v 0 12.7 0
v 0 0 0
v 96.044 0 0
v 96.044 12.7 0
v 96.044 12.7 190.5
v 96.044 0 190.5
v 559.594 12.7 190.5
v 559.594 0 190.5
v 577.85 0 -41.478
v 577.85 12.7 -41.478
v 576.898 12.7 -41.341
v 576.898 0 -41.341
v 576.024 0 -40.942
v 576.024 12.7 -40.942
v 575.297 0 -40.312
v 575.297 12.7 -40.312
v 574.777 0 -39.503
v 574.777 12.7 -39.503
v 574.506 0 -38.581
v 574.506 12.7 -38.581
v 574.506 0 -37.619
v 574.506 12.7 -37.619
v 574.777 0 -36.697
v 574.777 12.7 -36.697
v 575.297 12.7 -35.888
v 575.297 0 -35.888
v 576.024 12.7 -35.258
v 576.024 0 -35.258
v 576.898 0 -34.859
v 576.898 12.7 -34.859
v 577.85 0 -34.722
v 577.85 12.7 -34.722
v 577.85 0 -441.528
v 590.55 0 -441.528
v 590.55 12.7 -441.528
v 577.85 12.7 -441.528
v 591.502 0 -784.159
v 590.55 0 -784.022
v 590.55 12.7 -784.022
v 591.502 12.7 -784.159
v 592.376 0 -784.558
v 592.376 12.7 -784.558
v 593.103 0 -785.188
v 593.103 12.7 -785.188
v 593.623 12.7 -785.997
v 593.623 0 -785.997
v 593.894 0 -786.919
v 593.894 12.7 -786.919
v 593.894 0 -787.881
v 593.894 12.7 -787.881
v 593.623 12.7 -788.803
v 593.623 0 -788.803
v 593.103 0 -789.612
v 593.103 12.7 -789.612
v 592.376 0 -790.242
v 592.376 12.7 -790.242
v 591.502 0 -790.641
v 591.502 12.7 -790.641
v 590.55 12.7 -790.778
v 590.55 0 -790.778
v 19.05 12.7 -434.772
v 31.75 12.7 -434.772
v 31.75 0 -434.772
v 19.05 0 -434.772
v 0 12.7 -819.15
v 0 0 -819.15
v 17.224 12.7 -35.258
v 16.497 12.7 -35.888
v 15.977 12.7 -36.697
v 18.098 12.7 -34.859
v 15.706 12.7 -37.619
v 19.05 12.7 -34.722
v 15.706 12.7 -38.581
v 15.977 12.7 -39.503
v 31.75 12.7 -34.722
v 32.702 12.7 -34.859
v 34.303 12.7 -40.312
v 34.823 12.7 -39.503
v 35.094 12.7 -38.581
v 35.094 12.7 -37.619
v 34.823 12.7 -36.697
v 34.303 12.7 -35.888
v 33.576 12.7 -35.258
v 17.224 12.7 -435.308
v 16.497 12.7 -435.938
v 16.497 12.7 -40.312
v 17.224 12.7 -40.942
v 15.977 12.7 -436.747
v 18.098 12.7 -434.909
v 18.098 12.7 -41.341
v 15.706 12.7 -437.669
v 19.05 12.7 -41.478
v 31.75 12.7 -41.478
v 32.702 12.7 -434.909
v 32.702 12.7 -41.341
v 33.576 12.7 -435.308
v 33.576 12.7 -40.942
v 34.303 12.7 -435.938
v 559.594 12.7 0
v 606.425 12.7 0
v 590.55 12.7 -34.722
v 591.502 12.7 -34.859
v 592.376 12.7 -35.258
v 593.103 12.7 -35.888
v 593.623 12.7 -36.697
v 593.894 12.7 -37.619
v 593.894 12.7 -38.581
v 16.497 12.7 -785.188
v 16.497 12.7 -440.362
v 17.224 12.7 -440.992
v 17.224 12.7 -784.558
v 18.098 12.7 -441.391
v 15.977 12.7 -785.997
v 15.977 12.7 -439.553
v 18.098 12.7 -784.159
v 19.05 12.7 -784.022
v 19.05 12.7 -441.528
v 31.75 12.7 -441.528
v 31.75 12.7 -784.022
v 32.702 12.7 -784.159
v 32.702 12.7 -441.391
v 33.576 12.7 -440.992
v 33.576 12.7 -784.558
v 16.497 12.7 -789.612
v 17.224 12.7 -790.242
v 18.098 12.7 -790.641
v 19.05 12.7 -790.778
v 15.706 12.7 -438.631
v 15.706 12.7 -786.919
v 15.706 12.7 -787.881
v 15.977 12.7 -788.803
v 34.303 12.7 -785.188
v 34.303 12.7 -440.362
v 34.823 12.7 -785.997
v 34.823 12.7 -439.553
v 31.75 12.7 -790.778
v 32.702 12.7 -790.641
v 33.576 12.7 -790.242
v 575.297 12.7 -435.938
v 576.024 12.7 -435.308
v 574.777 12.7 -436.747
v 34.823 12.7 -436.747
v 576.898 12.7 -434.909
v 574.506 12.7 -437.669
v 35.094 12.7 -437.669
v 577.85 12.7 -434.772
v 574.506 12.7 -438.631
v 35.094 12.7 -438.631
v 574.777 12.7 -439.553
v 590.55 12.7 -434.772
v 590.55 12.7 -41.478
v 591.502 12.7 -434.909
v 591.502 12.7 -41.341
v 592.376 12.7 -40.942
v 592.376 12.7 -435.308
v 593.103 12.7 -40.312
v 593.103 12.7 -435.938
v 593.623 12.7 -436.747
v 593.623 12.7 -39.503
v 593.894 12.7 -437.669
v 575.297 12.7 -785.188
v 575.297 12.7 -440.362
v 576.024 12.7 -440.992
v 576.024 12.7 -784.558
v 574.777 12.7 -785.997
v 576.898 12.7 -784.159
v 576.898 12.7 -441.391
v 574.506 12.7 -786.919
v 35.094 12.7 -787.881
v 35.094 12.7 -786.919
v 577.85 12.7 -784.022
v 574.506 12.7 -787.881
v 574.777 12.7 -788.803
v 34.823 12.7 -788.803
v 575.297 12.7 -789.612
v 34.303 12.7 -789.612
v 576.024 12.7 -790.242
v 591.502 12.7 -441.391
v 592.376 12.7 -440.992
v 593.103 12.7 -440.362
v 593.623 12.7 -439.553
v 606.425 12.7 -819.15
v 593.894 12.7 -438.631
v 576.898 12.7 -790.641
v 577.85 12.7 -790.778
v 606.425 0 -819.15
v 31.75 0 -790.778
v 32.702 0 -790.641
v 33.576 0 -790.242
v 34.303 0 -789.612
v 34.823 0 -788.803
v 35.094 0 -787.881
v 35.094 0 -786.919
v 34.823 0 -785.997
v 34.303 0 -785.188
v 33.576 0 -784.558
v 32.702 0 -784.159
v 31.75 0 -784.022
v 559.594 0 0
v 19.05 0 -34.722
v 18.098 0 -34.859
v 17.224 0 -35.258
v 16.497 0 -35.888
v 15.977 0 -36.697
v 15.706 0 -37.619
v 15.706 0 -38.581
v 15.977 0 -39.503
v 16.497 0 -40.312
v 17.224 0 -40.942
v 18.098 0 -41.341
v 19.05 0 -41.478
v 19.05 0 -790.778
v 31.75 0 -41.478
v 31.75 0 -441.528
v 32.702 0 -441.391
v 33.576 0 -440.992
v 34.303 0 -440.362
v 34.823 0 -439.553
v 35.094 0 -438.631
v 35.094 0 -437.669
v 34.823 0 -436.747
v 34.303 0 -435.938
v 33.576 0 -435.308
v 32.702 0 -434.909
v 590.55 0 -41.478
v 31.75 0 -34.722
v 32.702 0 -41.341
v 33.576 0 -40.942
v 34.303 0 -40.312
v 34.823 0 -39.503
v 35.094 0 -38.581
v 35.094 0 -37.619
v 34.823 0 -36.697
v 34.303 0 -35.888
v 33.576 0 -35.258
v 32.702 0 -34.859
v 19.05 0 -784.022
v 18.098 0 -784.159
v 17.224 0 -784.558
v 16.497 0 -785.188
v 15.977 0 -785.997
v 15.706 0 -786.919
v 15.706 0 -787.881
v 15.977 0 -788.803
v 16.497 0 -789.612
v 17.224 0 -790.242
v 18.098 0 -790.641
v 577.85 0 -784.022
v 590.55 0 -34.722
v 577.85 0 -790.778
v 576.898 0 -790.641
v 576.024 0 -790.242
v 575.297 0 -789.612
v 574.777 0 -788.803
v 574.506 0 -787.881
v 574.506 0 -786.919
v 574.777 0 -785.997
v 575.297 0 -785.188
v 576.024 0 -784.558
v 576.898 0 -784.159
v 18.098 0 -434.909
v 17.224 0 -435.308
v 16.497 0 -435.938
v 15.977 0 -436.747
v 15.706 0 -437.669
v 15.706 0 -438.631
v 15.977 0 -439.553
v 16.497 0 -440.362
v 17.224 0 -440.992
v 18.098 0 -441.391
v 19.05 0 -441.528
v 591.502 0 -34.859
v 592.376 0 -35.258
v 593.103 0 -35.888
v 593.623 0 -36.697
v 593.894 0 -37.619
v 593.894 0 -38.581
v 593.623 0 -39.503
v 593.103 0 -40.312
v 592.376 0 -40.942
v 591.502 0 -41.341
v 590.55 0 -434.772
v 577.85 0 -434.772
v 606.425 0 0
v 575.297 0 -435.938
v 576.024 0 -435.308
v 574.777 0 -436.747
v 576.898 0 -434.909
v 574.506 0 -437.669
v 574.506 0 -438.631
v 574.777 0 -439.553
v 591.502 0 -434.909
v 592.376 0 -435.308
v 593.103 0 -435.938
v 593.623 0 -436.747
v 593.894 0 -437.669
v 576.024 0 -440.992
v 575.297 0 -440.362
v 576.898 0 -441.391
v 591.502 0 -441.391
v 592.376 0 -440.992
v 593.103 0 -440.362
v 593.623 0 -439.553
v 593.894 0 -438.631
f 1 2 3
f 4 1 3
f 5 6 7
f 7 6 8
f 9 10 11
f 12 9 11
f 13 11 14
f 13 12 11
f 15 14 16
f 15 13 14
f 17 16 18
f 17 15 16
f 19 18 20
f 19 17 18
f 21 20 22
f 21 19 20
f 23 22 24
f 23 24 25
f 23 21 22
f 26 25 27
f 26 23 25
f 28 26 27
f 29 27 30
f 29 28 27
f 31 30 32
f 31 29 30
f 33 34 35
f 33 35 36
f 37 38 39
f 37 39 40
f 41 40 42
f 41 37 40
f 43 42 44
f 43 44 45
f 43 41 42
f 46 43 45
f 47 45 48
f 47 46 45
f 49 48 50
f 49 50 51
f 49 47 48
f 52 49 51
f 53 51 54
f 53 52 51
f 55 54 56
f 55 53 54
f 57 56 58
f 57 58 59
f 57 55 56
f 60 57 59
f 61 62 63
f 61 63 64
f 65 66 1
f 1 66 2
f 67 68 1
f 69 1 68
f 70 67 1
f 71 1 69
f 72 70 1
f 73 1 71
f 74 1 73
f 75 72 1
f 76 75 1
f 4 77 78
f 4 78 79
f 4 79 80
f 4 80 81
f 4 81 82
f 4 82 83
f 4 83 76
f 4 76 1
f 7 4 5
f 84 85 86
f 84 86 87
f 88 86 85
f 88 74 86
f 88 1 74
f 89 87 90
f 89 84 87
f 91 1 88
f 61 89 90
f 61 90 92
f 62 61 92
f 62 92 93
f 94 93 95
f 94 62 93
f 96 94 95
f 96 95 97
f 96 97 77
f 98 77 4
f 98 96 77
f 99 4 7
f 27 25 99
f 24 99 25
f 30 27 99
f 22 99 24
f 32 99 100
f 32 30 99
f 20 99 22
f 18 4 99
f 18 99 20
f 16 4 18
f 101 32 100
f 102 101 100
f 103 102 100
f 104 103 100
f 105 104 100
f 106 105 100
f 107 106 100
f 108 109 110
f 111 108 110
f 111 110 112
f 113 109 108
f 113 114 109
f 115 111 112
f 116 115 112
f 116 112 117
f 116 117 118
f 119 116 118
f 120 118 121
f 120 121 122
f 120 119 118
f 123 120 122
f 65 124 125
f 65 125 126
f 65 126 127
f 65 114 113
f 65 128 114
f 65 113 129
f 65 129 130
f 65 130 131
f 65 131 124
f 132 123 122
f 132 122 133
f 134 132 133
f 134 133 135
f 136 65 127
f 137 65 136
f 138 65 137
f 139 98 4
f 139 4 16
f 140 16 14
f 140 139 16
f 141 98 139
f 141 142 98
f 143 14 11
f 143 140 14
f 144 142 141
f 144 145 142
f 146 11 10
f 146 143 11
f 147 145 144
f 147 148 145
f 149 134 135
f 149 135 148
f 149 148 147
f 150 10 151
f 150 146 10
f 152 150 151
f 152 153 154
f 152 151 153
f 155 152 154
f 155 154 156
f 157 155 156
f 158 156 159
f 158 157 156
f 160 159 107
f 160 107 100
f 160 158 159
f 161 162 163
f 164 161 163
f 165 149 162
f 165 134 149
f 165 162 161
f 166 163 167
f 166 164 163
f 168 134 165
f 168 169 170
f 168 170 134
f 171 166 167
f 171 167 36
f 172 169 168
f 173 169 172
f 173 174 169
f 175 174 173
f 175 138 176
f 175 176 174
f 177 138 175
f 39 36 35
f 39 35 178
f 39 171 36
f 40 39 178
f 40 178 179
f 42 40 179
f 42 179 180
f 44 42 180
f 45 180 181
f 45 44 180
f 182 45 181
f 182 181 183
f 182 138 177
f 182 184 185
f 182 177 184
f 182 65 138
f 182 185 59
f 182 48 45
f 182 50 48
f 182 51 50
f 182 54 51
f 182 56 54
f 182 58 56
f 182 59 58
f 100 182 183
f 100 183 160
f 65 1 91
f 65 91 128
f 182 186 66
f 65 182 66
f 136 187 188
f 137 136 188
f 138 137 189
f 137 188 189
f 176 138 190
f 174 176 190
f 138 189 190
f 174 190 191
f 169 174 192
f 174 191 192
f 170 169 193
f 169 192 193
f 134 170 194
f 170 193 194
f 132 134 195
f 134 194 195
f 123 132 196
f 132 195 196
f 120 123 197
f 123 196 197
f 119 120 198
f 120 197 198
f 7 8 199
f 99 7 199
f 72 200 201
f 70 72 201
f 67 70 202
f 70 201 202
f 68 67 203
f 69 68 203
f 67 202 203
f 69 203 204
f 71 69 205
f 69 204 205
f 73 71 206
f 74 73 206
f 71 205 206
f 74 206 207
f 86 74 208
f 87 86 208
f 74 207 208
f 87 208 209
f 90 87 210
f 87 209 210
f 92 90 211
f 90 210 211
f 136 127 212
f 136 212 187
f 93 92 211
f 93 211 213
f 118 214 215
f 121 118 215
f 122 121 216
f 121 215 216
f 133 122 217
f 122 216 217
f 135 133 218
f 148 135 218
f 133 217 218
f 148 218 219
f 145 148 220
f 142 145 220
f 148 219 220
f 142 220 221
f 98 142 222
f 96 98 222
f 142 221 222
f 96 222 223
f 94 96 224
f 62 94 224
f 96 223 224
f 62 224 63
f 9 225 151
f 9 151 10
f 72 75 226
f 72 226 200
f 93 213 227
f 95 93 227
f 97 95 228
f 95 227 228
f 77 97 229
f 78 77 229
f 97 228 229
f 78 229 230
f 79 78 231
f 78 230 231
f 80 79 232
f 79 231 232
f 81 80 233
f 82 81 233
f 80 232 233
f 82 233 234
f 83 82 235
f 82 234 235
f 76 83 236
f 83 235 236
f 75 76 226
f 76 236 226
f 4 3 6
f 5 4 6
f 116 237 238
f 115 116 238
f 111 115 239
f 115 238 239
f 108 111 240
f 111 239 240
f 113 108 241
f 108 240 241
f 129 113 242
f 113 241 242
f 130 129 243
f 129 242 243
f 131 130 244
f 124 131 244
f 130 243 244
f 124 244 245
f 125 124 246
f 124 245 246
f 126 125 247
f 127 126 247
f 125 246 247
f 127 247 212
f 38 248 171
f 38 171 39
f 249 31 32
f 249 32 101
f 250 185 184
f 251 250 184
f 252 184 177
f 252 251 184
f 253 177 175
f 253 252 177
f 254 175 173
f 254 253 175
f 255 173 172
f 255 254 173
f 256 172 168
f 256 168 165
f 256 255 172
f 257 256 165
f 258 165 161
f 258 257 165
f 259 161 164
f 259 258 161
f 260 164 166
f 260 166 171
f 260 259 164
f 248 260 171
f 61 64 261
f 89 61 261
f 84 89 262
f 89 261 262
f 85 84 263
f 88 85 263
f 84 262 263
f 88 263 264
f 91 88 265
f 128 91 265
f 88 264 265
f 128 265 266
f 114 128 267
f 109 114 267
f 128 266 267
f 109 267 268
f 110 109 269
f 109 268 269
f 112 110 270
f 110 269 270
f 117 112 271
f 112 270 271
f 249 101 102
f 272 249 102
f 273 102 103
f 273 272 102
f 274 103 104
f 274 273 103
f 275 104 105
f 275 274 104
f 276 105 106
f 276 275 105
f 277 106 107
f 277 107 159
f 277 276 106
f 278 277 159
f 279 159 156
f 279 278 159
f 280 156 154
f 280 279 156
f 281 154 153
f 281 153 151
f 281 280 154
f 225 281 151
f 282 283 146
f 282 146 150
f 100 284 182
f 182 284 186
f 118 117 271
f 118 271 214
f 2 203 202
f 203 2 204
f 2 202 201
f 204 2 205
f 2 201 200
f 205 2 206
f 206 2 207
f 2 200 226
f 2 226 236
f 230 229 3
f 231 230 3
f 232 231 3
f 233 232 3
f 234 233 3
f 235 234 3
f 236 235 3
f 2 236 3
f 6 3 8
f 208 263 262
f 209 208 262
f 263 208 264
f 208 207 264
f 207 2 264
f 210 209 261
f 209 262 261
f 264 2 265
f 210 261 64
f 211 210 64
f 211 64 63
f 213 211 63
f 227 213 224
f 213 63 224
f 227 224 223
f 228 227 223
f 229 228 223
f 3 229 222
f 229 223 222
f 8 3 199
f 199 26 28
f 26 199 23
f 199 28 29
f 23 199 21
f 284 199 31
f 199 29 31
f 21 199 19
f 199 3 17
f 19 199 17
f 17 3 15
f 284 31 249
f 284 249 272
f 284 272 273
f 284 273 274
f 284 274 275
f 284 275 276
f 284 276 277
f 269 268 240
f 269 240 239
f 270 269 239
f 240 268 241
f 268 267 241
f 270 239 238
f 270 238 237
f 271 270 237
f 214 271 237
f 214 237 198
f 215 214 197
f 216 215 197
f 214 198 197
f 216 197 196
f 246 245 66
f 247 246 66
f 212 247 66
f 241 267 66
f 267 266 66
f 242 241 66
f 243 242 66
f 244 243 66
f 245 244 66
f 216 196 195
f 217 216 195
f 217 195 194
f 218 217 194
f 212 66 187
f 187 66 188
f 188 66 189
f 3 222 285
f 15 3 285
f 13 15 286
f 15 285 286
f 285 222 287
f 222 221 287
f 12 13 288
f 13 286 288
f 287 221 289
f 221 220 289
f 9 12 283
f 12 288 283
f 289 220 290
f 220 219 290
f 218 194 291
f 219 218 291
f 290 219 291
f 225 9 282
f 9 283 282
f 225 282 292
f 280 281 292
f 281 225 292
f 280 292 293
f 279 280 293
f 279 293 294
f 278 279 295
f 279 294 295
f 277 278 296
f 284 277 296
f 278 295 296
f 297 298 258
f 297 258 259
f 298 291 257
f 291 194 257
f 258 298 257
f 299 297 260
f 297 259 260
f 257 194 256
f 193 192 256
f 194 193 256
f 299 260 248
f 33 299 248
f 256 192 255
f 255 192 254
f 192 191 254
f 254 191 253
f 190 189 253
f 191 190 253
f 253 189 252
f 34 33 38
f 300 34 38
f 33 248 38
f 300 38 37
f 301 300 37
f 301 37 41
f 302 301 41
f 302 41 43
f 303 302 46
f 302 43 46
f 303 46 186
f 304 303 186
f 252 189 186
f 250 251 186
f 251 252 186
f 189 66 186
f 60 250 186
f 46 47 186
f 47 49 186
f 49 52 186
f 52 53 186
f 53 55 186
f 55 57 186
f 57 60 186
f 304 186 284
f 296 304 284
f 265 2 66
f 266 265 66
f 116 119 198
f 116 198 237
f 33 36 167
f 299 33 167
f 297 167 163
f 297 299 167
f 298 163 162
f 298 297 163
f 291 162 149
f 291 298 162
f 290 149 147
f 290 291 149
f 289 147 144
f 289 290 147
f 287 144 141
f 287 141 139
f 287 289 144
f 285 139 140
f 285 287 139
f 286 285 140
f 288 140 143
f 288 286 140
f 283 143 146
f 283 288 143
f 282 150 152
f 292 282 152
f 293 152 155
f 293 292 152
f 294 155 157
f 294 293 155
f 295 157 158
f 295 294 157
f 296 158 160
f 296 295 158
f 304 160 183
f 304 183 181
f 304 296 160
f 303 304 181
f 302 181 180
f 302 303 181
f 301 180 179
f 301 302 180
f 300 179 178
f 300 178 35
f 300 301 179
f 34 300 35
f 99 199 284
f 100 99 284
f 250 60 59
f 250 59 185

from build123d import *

# Parameters (mm, degrees)
BOSS_EXTRUDE1_DEPTH = 12.7


with BuildPart() as part:
    # Sketch1 → Boss-Extrude1 (new body)
    with BuildSketch(Plane(origin=(0, 0, 0), x_dir=(1, 0, 0), z_dir=(0, 1, 0))):
        Polygon((0, 0), (96.04375, 0), (96.04375, -190.5), (559.59375, -190.5), (559.59375, 0), (606.425, 0), (606.425, 819.15), (0, 819.15), align=None)
        with BuildLine():
            Line((19.05, 41.4782), (31.75, 41.4782))
            ThreePointArc((31.75, 41.4782), (35.1282, 38.1), (31.75, 34.7218))
            Line((31.75, 34.7218), (19.05, 34.7218))
            ThreePointArc((19.05, 34.7218), (15.6718, 38.1), (19.05, 41.4782))
        make_face(mode=Mode.SUBTRACT)
        with BuildLine():
            Line((19.05, 441.5282), (31.75, 441.5282))
            ThreePointArc((31.75, 441.5282), (35.1282, 438.15), (31.75, 434.7718))
            Line((31.75, 434.7718), (19.05, 434.7718))
            ThreePointArc((19.05, 434.7718), (15.6718, 438.15), (19.05, 441.5282))
        make_face(mode=Mode.SUBTRACT)
        with BuildLine():
            Line((31.75, 784.0218), (19.05, 784.0218))
            ThreePointArc((19.05, 784.0218), (15.6718, 787.4), (19.05, 790.7782))
            Line((19.05, 790.7782), (31.75, 790.7782))
            ThreePointArc((31.75, 790.7782), (35.1282, 787.4), (31.75, 784.0218))
        make_face(mode=Mode.SUBTRACT)
        with BuildLine():
            Line((577.85, 784.0218), (590.55, 784.0218))
            ThreePointArc((590.55, 784.0218), (593.9282, 787.4), (590.55, 790.7782))
            Line((590.55, 790.7782), (577.85, 790.7782))
            ThreePointArc((577.85, 790.7782), (574.4718, 787.4), (577.85, 784.0218))
        make_face(mode=Mode.SUBTRACT)
        with BuildLine():
            Line((590.55, 441.5282), (577.85, 441.5282))
            ThreePointArc((577.85, 441.5282), (574.4718, 438.15), (577.85, 434.7718))
            Line((577.85, 434.7718), (590.55, 434.7718))
            ThreePointArc((590.55, 434.7718), (593.9282, 438.15), (590.55, 441.5282))
        make_face(mode=Mode.SUBTRACT)
        with BuildLine():
            Line((590.55, 41.4782), (577.85, 41.4782))
            ThreePointArc((577.85, 41.4782), (574.4718, 38.1), (577.85, 34.7218))
            Line((577.85, 34.7218), (590.55, 34.7218))
            ThreePointArc((590.55, 34.7218), (593.9282, 38.1), (590.55, 41.4782))
        make_face(mode=Mode.SUBTRACT)
    extrude(amount=BOSS_EXTRUDE1_DEPTH)


solid = part.part
